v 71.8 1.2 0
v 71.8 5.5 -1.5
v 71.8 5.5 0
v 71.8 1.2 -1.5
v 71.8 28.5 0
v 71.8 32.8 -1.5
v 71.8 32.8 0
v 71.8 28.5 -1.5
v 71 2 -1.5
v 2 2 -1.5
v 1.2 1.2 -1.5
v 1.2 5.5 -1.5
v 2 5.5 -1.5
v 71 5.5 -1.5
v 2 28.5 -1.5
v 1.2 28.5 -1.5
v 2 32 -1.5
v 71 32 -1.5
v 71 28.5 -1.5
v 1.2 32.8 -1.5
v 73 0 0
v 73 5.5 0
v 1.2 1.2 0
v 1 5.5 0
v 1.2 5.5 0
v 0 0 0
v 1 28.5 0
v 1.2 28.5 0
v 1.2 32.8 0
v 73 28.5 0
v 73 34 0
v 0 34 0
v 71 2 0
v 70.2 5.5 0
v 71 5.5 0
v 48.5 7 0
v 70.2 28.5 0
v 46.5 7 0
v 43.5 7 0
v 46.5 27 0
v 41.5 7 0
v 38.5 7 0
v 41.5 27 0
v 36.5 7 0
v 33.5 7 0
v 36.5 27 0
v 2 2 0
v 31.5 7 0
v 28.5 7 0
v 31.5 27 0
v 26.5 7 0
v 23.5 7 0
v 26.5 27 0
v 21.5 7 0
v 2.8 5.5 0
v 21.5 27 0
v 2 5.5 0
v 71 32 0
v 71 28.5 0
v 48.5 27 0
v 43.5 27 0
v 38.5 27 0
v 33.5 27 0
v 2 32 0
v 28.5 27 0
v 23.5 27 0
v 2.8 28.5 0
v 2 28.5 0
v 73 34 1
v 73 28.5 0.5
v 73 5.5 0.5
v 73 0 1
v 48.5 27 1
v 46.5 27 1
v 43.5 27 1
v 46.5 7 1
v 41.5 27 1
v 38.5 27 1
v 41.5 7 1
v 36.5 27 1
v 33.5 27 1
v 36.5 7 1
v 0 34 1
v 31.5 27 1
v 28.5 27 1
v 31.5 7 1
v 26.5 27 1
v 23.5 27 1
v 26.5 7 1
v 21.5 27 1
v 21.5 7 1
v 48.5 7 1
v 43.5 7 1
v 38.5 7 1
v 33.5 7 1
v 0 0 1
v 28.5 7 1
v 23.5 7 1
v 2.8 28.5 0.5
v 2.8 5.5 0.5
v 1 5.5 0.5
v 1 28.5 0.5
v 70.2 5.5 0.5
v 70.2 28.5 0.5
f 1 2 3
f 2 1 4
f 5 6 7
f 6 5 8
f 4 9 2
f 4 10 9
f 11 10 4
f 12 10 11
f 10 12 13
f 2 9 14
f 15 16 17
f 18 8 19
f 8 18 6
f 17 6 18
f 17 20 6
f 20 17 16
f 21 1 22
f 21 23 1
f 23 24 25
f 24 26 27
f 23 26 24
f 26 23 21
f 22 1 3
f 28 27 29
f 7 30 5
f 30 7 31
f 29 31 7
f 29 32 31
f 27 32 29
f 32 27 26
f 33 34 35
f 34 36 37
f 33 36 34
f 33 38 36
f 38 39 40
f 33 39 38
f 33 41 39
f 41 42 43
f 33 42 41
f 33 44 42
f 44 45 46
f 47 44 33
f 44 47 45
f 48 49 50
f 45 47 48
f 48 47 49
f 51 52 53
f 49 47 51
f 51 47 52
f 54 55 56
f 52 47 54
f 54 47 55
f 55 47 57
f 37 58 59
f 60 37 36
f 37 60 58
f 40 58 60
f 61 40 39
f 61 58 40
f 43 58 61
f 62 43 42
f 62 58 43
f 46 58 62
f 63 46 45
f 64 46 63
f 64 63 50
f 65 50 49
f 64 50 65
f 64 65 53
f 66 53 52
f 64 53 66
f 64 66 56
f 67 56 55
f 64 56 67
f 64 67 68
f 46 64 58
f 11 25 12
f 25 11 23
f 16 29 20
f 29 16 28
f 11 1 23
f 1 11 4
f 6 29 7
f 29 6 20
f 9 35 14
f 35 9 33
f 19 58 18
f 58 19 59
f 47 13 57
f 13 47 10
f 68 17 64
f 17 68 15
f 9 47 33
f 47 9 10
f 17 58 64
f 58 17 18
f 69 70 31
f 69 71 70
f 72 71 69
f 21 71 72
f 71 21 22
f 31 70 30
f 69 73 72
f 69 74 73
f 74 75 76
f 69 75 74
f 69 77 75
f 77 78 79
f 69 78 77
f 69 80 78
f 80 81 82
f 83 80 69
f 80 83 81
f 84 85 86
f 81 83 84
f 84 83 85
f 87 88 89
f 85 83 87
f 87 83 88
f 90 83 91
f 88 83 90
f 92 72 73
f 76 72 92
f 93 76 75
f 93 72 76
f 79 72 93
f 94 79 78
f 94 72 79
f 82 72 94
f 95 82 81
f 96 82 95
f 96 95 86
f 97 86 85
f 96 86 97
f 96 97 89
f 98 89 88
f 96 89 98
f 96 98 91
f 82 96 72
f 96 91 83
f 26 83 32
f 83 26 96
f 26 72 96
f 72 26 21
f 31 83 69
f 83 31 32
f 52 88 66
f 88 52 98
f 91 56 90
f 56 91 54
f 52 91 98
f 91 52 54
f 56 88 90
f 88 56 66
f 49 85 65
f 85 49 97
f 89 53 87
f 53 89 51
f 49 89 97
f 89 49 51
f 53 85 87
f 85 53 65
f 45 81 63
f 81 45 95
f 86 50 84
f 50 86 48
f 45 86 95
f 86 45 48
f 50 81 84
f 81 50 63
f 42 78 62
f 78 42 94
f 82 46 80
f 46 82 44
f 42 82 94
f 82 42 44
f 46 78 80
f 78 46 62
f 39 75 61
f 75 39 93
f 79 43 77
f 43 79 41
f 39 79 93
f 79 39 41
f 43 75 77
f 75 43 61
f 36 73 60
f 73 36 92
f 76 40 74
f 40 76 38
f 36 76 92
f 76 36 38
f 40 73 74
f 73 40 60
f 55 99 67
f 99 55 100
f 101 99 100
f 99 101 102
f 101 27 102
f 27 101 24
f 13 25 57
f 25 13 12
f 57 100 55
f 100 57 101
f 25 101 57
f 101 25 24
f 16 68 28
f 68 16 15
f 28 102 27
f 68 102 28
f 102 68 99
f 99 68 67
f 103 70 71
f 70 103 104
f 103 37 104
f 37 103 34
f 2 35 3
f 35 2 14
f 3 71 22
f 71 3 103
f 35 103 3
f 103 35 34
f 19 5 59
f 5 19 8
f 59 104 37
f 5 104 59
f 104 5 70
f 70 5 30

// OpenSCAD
// ==========================================
// Raspberry Pi Zero 2 W - Bento Box (Top Cover) - Final Fixed Ver.
// ==========================================

// --- Raspberry Pi Zero 2 W 基本サイズ ---
pi_w = 69.0; // SDカードの2mmはみ出しを含めた調整値
pi_d = 30.0; 

// --- ケースの基本設定 ---
thickness = 1.0;    // テスト用の壁の厚み (1.0mm)
clearance = 1.0;    // 基板とケース内壁の隙間
cover_h   = 1.5;    // 【修正】内部部品と干渉しないようインロー高さを1.5mmに最適化

// 内寸と外寸の計算
inner_w = pi_w + (clearance * 2);
inner_d = pi_d + (clearance * 2);
outer_w = inner_w + (thickness * 2);
outer_d = inner_d + (thickness * 2);

// --- メインレンダリング ---
// 【修正】180度反転させたときにベッド（床）の上に正しく接地するように座標修正
translate([0, outer_d, thickness])
    rotate([180, 0, 0])
        top_cover();

// --- モジュール定義 ---
module top_cover() {
    fit_gap       = 0.2; // 嵌め合い部（インロー）のクリアランス
    lip_thickness = 0.8; // インローの突起自体の肉厚
    
    difference() {
        union() {
            // 蓋の天面プレート
            cube([outer_w, outer_d, thickness]);
            
            // 凹凸の噛み合わせ（インロー固定部）
            translate([thickness + fit_gap, thickness + fit_gap, thickness])
                difference() {
                    cube([inner_w - (fit_gap * 2), inner_d - (fit_gap * 2), cover_h]);
                    
                    // 内側をくり抜いて突起（リップ）を形成
                    translate([lip_thickness, lip_thickness, -0.5])
                        cube([
                            inner_w - (fit_gap * 2) - (lip_thickness * 2), 
                            inner_d - (fit_gap * 2) - (lip_thickness * 2), 
                            cover_h + 1
                        ]);
                }
        }
        
        // ✂️ 【重要追加】ボトム側の左右21mm窓と干渉するインローの壁をカットする処理
        // 左側のインローを逃がす（21mm窓に連動）
        translate([thickness, outer_d/2 - 11.5, thickness - 0.5])
            cube([lip_thickness + 1, 23, cover_h + 1]);
            
        // 右側のインローを逃がす（21mm窓に連動）
        translate([outer_w - thickness - lip_thickness - 1, outer_d/2 - 11.5, thickness - 0.5])
            cube([lip_thickness + 2, 23, cover_h + 1]);

        // 放熱用のスリット穴
        for (i = [0 : 5]) {
            translate([outer_w / 2 - 15 + (i * 5), outer_d / 2 - 10, -0.5])
                cube([2, 20, thickness + 1]);
        }
    }
}
